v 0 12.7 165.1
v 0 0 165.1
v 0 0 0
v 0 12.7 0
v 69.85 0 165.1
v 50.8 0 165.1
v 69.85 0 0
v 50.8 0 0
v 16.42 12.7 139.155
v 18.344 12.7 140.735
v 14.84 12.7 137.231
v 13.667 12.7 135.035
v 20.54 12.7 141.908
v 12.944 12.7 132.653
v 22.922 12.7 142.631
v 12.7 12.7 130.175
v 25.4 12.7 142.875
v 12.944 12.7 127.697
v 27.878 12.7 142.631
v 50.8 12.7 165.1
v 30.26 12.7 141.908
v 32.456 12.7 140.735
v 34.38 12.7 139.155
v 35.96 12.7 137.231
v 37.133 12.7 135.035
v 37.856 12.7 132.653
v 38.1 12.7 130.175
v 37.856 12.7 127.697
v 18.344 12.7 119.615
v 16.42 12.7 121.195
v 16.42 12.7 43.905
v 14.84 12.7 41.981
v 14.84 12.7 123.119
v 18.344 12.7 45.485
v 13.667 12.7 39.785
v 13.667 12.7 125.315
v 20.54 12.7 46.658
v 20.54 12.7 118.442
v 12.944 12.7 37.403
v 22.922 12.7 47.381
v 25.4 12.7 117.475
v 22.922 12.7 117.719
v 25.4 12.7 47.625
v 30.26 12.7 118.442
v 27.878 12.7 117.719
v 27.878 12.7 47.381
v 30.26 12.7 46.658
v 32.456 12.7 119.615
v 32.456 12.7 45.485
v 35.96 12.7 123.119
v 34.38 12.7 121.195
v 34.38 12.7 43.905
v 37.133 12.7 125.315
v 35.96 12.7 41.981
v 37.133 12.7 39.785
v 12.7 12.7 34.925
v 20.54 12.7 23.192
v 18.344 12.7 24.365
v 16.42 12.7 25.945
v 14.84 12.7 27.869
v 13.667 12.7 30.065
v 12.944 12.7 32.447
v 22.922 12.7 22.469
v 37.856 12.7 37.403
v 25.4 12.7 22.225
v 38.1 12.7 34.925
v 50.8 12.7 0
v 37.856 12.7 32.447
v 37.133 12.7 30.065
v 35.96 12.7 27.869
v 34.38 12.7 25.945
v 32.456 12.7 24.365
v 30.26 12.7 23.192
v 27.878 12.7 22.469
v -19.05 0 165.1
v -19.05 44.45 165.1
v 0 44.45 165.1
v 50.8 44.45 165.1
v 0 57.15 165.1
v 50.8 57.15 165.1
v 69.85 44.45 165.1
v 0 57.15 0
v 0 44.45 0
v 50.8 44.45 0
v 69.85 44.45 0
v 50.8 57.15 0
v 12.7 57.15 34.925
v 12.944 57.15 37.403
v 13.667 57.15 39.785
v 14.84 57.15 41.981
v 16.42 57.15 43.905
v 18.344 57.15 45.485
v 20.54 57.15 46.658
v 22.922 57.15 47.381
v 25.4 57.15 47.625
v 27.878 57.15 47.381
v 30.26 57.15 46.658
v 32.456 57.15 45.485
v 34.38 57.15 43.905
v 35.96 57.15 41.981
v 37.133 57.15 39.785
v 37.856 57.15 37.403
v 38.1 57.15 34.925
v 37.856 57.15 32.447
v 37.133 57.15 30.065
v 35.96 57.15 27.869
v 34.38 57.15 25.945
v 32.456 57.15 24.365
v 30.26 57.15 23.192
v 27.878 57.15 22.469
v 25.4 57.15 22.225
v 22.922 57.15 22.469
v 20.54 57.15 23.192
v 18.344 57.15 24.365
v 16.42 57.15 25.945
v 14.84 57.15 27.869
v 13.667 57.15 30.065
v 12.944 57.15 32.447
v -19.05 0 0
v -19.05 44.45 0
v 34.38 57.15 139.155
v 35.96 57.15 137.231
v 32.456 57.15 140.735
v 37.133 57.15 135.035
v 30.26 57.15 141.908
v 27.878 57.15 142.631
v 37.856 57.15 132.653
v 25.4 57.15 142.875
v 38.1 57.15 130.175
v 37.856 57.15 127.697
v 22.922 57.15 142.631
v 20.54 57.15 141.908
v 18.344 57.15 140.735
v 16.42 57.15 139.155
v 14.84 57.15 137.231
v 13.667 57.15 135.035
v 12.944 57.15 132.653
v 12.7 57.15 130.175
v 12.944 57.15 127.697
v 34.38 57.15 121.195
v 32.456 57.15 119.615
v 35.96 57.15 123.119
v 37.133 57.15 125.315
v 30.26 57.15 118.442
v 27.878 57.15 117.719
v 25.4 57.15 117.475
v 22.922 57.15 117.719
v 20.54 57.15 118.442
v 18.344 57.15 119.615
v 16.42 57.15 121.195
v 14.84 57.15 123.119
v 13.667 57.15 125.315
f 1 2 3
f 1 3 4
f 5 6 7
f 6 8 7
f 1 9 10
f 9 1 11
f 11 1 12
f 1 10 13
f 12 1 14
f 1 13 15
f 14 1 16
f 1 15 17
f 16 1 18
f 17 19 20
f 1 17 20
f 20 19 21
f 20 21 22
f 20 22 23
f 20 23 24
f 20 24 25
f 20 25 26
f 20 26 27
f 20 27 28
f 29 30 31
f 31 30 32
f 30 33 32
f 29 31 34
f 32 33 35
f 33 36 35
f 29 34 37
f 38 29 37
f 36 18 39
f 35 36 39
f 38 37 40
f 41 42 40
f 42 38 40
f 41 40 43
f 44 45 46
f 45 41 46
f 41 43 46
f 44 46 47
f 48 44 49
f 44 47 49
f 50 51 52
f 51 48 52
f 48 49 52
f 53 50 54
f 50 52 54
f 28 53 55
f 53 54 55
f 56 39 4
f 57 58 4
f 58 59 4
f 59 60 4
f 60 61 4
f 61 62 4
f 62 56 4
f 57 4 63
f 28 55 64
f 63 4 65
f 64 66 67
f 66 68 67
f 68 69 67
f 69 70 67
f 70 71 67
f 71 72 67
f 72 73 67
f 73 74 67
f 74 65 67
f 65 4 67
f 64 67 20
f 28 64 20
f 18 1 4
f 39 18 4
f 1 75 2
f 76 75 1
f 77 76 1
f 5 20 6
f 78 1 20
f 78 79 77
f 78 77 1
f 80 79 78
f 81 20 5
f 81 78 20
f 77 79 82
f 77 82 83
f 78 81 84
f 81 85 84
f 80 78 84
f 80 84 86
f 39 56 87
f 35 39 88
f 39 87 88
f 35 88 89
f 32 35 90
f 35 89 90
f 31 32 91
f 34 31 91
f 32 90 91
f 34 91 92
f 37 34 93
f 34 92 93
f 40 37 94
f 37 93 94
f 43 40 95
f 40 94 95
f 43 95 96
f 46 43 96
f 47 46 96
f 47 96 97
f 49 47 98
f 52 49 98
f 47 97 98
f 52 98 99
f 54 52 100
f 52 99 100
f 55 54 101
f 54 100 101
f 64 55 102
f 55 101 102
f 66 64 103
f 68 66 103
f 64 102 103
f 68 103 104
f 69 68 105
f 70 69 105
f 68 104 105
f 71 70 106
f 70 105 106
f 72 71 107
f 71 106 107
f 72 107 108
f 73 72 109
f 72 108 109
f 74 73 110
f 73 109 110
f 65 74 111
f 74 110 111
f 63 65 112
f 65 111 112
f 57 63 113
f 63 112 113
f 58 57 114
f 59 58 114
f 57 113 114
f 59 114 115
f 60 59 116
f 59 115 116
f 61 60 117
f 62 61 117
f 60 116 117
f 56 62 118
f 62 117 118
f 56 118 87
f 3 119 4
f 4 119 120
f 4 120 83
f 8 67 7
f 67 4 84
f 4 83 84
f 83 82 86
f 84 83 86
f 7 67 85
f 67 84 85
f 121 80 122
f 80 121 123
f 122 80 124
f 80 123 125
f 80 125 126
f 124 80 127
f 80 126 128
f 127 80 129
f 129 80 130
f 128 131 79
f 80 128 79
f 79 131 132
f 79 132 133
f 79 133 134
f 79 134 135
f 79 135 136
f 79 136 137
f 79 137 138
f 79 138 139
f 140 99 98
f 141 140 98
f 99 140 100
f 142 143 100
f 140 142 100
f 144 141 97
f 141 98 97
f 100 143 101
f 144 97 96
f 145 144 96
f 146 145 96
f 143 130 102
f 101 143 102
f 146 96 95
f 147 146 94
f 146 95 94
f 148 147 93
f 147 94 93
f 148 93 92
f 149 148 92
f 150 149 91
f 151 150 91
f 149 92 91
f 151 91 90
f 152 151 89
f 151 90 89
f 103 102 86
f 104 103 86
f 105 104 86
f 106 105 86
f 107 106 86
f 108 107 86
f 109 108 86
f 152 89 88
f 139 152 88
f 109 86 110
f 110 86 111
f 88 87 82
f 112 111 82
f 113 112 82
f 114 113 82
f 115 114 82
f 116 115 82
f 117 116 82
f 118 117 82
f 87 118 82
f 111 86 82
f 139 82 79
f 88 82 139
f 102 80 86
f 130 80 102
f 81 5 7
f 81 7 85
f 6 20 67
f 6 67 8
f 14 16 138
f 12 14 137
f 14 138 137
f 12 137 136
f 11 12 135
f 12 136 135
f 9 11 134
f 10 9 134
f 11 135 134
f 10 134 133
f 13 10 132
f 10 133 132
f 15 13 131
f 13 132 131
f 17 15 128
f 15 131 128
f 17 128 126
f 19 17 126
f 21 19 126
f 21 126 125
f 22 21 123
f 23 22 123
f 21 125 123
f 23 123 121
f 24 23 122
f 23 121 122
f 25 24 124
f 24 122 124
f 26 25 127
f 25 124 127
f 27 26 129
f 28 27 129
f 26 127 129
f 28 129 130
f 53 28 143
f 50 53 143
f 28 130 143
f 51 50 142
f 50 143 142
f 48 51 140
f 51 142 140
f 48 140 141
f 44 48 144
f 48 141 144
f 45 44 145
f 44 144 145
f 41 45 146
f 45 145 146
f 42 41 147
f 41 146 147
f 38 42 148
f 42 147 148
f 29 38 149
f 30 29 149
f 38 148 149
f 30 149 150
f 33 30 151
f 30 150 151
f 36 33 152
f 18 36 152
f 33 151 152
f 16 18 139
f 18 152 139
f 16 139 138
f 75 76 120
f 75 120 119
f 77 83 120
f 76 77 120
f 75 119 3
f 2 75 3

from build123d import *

# Parameters (mm, degrees)
F1_DEPTH = 25.4
F2_DEPTH = 139.7
F3_R     = 12.7
F4_DEPTH = 44.45
F5_DEPTH = 44.45


with BuildPart() as f1:
    # F0 (on Top) → F1 (new body)
    with BuildSketch(Plane.XY):
        Polygon((-19.05, 0), (0, 0), (0, 12.7), (50.8, 12.7), (50.8, 0), (69.85, 0), (69.85, 44.45), (50.8, 44.45), (50.8, 57.15), (0, 57.15), (0, 44.45), (-19.05, 44.45), align=None)
    extrude(amount=F1_DEPTH)

    # F1_face (on face) → F2 (join)
    with BuildSketch(Plane(origin=(25.4, 29.482143, 25.4), x_dir=(1, 0, 0), z_dir=(0, 0, 1))):
        Polygon((-44.45, -29.482143), (-25.4, -29.482143), (-25.4, -16.782143), (25.4, -16.782143), (25.4, -29.482143), (44.45, -29.482143), (44.45, 14.967857), (25.4, 14.967857), (25.4, 27.667857), (-25.4, 27.667857), (-25.4, 14.967857), (-44.45, 14.967857), align=None)
    extrude(amount=F2_DEPTH)

    # F3 (on face) → F4 (cut, through all)
    with BuildSketch(Plane(origin=(0, 57.15, 0), x_dir=(-1, 0, 0), z_dir=(0, 1, 0))):
        with Locations((-25.4, 130.175)):
            Circle(F3_R)
    extrude(amount=-F4_DEPTH, mode=Mode.SUBTRACT)

    # F3 (on face) → F5 (cut, through all)
    with BuildSketch(Plane(origin=(0, 57.15, 0), x_dir=(-1, 0, 0), z_dir=(0, 1, 0))):
        with Locations((-25.4, 34.925)):
            Circle(F3_R)
    extrude(amount=-F5_DEPTH, mode=Mode.SUBTRACT)


solid = f1.part
